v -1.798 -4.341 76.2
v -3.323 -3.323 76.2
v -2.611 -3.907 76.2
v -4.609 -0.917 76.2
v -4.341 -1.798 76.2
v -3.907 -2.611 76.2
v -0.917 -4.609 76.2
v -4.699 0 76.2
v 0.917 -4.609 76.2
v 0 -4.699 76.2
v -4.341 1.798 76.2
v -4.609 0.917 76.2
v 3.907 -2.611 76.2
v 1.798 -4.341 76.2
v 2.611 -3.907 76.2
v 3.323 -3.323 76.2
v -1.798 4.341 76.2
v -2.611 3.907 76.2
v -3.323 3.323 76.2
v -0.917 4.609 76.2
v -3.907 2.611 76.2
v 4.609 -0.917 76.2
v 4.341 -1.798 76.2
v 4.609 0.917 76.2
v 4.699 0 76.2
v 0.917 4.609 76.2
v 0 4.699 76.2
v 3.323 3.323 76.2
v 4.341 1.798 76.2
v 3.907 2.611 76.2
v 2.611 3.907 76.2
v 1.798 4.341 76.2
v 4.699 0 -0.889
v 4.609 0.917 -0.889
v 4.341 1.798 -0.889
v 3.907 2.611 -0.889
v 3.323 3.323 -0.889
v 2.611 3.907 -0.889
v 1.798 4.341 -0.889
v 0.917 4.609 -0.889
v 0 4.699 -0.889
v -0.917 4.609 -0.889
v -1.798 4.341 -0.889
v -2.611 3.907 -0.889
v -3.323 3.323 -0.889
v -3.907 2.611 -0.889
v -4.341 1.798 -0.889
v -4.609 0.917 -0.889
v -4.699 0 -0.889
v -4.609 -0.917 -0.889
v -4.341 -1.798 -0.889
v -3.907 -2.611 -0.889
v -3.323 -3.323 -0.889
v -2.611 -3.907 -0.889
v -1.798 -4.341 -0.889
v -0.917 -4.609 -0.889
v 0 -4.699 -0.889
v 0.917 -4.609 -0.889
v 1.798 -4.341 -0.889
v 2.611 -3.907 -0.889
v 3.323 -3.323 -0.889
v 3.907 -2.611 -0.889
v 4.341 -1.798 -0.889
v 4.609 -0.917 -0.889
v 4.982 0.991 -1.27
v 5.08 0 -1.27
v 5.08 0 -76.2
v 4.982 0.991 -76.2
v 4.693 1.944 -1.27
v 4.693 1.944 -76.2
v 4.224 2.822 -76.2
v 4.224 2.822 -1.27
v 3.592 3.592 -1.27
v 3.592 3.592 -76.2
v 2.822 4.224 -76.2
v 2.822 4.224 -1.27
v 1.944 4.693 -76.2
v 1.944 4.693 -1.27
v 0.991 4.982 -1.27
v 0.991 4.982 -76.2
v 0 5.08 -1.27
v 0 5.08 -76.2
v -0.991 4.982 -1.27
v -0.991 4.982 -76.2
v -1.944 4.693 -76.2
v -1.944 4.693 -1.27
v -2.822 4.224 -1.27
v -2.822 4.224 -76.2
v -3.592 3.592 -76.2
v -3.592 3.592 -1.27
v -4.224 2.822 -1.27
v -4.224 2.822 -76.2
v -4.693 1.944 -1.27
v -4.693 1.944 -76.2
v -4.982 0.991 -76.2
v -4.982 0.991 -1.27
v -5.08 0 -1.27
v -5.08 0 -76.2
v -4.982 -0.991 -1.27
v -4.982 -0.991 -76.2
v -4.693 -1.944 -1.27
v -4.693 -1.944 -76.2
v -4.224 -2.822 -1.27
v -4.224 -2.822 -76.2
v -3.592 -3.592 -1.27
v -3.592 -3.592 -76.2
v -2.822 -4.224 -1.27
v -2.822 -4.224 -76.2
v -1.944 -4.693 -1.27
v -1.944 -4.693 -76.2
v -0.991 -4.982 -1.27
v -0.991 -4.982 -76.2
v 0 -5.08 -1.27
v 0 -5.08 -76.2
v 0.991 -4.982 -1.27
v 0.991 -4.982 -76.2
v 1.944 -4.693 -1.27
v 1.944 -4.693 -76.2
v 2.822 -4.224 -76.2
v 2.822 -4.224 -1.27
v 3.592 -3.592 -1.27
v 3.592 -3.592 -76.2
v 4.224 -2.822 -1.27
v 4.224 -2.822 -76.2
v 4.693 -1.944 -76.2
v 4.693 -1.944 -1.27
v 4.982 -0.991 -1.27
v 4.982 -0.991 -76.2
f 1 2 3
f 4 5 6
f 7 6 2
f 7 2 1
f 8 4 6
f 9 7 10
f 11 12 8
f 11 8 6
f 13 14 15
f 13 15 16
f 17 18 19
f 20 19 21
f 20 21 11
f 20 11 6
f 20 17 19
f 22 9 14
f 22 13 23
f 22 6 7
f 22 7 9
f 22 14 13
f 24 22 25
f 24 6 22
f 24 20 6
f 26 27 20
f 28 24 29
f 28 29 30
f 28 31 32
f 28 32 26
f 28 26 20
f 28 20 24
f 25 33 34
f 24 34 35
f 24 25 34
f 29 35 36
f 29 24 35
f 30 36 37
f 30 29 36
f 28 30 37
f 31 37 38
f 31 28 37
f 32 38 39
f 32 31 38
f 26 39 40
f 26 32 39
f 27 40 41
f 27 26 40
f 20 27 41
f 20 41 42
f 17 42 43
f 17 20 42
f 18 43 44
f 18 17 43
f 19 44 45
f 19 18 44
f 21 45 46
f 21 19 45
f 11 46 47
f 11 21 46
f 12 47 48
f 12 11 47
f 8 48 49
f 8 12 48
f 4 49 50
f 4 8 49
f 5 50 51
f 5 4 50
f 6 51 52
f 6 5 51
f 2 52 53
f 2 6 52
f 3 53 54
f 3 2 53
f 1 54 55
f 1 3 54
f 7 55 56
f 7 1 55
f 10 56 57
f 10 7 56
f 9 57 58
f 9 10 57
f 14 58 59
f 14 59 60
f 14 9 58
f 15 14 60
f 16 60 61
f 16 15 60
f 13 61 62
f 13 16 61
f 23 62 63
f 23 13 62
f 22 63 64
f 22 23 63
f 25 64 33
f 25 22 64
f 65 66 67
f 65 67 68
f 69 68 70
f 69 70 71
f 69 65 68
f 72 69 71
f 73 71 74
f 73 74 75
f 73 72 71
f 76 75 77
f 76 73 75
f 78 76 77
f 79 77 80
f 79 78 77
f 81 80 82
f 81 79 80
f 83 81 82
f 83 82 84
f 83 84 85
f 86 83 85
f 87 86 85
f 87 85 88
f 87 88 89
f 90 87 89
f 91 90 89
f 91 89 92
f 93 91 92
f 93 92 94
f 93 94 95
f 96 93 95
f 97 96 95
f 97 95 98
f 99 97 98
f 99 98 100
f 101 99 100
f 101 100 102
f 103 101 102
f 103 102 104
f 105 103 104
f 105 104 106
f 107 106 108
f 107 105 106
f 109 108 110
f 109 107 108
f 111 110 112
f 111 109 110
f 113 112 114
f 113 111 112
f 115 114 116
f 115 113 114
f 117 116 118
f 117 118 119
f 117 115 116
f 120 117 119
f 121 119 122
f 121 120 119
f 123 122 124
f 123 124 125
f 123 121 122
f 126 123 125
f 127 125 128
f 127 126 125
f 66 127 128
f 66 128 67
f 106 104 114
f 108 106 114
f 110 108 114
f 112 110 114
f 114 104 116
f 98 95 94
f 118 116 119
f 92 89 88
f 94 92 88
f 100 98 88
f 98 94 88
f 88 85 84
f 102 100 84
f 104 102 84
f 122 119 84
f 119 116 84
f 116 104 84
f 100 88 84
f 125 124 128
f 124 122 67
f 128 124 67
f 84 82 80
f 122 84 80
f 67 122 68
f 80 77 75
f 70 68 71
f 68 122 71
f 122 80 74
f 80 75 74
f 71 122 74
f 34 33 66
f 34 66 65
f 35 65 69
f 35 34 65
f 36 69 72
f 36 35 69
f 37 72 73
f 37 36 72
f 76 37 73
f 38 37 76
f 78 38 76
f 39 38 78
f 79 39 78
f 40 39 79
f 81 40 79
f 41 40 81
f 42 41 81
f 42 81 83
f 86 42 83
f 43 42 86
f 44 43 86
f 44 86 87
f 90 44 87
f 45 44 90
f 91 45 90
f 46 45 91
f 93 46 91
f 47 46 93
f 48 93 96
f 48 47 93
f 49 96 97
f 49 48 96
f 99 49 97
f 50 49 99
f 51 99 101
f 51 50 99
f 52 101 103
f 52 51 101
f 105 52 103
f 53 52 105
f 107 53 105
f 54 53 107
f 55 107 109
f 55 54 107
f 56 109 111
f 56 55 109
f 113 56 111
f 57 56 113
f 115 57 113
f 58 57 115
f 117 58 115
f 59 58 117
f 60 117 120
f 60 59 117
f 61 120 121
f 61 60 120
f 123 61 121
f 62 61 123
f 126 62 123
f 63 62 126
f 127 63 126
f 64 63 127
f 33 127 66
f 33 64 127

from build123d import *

# Parameters (mm, degrees)
F0_R        = 5.08
F1_DEPTH    = 76.2
F2_R        = 4.699
F3_DEPTH    = 76.2
F4_S5_R     = 4.699
F4_T6_DEPTH = 9


# Not quite as in the source:
# - a fillet or chamfer that OpenCascade refuses, or shapes differently, is made with other operations: its cross-section is extruded or revolved along the edge and cut away or added


with BuildPart() as f1:
    # F0 (on Top) → F1 (new body)
    with BuildSketch(Plane.XY):
        Circle(F0_R)
    extrude(amount=-F1_DEPTH)

    # F2 (on face) → F3 (join)
    with BuildSketch(Plane.XY):
        Circle(F2_R)
    extrude(amount=F3_DEPTH)

    # F4: chamfer of 1.27 on 1 edges, made by hand


with BuildPart() as f4_tool2:
    # F4_s3 → F4_t4 (revolve)
    with BuildSketch(Plane.XZ):
        Polygon((5.08, -1.27), (3.81, 0), (5.08, 0), align=None)
    revolve(axis=Axis((0, 0, 0), (0, 0, 1)))

    # F4_s5 → F4_t6 (cut, symmetric)
    with BuildSketch(Plane.XY.offset(-0.6)):
        Circle(F4_S5_R)
    extrude(amount=F4_T6_DEPTH, both=True, mode=Mode.SUBTRACT)


with BuildPart() as f1_1:
    add(f1.part)

    # F4_t1: cut F4_tool2
    add(f4_tool2.part, mode=Mode.SUBTRACT)


solid = f1_1.part
